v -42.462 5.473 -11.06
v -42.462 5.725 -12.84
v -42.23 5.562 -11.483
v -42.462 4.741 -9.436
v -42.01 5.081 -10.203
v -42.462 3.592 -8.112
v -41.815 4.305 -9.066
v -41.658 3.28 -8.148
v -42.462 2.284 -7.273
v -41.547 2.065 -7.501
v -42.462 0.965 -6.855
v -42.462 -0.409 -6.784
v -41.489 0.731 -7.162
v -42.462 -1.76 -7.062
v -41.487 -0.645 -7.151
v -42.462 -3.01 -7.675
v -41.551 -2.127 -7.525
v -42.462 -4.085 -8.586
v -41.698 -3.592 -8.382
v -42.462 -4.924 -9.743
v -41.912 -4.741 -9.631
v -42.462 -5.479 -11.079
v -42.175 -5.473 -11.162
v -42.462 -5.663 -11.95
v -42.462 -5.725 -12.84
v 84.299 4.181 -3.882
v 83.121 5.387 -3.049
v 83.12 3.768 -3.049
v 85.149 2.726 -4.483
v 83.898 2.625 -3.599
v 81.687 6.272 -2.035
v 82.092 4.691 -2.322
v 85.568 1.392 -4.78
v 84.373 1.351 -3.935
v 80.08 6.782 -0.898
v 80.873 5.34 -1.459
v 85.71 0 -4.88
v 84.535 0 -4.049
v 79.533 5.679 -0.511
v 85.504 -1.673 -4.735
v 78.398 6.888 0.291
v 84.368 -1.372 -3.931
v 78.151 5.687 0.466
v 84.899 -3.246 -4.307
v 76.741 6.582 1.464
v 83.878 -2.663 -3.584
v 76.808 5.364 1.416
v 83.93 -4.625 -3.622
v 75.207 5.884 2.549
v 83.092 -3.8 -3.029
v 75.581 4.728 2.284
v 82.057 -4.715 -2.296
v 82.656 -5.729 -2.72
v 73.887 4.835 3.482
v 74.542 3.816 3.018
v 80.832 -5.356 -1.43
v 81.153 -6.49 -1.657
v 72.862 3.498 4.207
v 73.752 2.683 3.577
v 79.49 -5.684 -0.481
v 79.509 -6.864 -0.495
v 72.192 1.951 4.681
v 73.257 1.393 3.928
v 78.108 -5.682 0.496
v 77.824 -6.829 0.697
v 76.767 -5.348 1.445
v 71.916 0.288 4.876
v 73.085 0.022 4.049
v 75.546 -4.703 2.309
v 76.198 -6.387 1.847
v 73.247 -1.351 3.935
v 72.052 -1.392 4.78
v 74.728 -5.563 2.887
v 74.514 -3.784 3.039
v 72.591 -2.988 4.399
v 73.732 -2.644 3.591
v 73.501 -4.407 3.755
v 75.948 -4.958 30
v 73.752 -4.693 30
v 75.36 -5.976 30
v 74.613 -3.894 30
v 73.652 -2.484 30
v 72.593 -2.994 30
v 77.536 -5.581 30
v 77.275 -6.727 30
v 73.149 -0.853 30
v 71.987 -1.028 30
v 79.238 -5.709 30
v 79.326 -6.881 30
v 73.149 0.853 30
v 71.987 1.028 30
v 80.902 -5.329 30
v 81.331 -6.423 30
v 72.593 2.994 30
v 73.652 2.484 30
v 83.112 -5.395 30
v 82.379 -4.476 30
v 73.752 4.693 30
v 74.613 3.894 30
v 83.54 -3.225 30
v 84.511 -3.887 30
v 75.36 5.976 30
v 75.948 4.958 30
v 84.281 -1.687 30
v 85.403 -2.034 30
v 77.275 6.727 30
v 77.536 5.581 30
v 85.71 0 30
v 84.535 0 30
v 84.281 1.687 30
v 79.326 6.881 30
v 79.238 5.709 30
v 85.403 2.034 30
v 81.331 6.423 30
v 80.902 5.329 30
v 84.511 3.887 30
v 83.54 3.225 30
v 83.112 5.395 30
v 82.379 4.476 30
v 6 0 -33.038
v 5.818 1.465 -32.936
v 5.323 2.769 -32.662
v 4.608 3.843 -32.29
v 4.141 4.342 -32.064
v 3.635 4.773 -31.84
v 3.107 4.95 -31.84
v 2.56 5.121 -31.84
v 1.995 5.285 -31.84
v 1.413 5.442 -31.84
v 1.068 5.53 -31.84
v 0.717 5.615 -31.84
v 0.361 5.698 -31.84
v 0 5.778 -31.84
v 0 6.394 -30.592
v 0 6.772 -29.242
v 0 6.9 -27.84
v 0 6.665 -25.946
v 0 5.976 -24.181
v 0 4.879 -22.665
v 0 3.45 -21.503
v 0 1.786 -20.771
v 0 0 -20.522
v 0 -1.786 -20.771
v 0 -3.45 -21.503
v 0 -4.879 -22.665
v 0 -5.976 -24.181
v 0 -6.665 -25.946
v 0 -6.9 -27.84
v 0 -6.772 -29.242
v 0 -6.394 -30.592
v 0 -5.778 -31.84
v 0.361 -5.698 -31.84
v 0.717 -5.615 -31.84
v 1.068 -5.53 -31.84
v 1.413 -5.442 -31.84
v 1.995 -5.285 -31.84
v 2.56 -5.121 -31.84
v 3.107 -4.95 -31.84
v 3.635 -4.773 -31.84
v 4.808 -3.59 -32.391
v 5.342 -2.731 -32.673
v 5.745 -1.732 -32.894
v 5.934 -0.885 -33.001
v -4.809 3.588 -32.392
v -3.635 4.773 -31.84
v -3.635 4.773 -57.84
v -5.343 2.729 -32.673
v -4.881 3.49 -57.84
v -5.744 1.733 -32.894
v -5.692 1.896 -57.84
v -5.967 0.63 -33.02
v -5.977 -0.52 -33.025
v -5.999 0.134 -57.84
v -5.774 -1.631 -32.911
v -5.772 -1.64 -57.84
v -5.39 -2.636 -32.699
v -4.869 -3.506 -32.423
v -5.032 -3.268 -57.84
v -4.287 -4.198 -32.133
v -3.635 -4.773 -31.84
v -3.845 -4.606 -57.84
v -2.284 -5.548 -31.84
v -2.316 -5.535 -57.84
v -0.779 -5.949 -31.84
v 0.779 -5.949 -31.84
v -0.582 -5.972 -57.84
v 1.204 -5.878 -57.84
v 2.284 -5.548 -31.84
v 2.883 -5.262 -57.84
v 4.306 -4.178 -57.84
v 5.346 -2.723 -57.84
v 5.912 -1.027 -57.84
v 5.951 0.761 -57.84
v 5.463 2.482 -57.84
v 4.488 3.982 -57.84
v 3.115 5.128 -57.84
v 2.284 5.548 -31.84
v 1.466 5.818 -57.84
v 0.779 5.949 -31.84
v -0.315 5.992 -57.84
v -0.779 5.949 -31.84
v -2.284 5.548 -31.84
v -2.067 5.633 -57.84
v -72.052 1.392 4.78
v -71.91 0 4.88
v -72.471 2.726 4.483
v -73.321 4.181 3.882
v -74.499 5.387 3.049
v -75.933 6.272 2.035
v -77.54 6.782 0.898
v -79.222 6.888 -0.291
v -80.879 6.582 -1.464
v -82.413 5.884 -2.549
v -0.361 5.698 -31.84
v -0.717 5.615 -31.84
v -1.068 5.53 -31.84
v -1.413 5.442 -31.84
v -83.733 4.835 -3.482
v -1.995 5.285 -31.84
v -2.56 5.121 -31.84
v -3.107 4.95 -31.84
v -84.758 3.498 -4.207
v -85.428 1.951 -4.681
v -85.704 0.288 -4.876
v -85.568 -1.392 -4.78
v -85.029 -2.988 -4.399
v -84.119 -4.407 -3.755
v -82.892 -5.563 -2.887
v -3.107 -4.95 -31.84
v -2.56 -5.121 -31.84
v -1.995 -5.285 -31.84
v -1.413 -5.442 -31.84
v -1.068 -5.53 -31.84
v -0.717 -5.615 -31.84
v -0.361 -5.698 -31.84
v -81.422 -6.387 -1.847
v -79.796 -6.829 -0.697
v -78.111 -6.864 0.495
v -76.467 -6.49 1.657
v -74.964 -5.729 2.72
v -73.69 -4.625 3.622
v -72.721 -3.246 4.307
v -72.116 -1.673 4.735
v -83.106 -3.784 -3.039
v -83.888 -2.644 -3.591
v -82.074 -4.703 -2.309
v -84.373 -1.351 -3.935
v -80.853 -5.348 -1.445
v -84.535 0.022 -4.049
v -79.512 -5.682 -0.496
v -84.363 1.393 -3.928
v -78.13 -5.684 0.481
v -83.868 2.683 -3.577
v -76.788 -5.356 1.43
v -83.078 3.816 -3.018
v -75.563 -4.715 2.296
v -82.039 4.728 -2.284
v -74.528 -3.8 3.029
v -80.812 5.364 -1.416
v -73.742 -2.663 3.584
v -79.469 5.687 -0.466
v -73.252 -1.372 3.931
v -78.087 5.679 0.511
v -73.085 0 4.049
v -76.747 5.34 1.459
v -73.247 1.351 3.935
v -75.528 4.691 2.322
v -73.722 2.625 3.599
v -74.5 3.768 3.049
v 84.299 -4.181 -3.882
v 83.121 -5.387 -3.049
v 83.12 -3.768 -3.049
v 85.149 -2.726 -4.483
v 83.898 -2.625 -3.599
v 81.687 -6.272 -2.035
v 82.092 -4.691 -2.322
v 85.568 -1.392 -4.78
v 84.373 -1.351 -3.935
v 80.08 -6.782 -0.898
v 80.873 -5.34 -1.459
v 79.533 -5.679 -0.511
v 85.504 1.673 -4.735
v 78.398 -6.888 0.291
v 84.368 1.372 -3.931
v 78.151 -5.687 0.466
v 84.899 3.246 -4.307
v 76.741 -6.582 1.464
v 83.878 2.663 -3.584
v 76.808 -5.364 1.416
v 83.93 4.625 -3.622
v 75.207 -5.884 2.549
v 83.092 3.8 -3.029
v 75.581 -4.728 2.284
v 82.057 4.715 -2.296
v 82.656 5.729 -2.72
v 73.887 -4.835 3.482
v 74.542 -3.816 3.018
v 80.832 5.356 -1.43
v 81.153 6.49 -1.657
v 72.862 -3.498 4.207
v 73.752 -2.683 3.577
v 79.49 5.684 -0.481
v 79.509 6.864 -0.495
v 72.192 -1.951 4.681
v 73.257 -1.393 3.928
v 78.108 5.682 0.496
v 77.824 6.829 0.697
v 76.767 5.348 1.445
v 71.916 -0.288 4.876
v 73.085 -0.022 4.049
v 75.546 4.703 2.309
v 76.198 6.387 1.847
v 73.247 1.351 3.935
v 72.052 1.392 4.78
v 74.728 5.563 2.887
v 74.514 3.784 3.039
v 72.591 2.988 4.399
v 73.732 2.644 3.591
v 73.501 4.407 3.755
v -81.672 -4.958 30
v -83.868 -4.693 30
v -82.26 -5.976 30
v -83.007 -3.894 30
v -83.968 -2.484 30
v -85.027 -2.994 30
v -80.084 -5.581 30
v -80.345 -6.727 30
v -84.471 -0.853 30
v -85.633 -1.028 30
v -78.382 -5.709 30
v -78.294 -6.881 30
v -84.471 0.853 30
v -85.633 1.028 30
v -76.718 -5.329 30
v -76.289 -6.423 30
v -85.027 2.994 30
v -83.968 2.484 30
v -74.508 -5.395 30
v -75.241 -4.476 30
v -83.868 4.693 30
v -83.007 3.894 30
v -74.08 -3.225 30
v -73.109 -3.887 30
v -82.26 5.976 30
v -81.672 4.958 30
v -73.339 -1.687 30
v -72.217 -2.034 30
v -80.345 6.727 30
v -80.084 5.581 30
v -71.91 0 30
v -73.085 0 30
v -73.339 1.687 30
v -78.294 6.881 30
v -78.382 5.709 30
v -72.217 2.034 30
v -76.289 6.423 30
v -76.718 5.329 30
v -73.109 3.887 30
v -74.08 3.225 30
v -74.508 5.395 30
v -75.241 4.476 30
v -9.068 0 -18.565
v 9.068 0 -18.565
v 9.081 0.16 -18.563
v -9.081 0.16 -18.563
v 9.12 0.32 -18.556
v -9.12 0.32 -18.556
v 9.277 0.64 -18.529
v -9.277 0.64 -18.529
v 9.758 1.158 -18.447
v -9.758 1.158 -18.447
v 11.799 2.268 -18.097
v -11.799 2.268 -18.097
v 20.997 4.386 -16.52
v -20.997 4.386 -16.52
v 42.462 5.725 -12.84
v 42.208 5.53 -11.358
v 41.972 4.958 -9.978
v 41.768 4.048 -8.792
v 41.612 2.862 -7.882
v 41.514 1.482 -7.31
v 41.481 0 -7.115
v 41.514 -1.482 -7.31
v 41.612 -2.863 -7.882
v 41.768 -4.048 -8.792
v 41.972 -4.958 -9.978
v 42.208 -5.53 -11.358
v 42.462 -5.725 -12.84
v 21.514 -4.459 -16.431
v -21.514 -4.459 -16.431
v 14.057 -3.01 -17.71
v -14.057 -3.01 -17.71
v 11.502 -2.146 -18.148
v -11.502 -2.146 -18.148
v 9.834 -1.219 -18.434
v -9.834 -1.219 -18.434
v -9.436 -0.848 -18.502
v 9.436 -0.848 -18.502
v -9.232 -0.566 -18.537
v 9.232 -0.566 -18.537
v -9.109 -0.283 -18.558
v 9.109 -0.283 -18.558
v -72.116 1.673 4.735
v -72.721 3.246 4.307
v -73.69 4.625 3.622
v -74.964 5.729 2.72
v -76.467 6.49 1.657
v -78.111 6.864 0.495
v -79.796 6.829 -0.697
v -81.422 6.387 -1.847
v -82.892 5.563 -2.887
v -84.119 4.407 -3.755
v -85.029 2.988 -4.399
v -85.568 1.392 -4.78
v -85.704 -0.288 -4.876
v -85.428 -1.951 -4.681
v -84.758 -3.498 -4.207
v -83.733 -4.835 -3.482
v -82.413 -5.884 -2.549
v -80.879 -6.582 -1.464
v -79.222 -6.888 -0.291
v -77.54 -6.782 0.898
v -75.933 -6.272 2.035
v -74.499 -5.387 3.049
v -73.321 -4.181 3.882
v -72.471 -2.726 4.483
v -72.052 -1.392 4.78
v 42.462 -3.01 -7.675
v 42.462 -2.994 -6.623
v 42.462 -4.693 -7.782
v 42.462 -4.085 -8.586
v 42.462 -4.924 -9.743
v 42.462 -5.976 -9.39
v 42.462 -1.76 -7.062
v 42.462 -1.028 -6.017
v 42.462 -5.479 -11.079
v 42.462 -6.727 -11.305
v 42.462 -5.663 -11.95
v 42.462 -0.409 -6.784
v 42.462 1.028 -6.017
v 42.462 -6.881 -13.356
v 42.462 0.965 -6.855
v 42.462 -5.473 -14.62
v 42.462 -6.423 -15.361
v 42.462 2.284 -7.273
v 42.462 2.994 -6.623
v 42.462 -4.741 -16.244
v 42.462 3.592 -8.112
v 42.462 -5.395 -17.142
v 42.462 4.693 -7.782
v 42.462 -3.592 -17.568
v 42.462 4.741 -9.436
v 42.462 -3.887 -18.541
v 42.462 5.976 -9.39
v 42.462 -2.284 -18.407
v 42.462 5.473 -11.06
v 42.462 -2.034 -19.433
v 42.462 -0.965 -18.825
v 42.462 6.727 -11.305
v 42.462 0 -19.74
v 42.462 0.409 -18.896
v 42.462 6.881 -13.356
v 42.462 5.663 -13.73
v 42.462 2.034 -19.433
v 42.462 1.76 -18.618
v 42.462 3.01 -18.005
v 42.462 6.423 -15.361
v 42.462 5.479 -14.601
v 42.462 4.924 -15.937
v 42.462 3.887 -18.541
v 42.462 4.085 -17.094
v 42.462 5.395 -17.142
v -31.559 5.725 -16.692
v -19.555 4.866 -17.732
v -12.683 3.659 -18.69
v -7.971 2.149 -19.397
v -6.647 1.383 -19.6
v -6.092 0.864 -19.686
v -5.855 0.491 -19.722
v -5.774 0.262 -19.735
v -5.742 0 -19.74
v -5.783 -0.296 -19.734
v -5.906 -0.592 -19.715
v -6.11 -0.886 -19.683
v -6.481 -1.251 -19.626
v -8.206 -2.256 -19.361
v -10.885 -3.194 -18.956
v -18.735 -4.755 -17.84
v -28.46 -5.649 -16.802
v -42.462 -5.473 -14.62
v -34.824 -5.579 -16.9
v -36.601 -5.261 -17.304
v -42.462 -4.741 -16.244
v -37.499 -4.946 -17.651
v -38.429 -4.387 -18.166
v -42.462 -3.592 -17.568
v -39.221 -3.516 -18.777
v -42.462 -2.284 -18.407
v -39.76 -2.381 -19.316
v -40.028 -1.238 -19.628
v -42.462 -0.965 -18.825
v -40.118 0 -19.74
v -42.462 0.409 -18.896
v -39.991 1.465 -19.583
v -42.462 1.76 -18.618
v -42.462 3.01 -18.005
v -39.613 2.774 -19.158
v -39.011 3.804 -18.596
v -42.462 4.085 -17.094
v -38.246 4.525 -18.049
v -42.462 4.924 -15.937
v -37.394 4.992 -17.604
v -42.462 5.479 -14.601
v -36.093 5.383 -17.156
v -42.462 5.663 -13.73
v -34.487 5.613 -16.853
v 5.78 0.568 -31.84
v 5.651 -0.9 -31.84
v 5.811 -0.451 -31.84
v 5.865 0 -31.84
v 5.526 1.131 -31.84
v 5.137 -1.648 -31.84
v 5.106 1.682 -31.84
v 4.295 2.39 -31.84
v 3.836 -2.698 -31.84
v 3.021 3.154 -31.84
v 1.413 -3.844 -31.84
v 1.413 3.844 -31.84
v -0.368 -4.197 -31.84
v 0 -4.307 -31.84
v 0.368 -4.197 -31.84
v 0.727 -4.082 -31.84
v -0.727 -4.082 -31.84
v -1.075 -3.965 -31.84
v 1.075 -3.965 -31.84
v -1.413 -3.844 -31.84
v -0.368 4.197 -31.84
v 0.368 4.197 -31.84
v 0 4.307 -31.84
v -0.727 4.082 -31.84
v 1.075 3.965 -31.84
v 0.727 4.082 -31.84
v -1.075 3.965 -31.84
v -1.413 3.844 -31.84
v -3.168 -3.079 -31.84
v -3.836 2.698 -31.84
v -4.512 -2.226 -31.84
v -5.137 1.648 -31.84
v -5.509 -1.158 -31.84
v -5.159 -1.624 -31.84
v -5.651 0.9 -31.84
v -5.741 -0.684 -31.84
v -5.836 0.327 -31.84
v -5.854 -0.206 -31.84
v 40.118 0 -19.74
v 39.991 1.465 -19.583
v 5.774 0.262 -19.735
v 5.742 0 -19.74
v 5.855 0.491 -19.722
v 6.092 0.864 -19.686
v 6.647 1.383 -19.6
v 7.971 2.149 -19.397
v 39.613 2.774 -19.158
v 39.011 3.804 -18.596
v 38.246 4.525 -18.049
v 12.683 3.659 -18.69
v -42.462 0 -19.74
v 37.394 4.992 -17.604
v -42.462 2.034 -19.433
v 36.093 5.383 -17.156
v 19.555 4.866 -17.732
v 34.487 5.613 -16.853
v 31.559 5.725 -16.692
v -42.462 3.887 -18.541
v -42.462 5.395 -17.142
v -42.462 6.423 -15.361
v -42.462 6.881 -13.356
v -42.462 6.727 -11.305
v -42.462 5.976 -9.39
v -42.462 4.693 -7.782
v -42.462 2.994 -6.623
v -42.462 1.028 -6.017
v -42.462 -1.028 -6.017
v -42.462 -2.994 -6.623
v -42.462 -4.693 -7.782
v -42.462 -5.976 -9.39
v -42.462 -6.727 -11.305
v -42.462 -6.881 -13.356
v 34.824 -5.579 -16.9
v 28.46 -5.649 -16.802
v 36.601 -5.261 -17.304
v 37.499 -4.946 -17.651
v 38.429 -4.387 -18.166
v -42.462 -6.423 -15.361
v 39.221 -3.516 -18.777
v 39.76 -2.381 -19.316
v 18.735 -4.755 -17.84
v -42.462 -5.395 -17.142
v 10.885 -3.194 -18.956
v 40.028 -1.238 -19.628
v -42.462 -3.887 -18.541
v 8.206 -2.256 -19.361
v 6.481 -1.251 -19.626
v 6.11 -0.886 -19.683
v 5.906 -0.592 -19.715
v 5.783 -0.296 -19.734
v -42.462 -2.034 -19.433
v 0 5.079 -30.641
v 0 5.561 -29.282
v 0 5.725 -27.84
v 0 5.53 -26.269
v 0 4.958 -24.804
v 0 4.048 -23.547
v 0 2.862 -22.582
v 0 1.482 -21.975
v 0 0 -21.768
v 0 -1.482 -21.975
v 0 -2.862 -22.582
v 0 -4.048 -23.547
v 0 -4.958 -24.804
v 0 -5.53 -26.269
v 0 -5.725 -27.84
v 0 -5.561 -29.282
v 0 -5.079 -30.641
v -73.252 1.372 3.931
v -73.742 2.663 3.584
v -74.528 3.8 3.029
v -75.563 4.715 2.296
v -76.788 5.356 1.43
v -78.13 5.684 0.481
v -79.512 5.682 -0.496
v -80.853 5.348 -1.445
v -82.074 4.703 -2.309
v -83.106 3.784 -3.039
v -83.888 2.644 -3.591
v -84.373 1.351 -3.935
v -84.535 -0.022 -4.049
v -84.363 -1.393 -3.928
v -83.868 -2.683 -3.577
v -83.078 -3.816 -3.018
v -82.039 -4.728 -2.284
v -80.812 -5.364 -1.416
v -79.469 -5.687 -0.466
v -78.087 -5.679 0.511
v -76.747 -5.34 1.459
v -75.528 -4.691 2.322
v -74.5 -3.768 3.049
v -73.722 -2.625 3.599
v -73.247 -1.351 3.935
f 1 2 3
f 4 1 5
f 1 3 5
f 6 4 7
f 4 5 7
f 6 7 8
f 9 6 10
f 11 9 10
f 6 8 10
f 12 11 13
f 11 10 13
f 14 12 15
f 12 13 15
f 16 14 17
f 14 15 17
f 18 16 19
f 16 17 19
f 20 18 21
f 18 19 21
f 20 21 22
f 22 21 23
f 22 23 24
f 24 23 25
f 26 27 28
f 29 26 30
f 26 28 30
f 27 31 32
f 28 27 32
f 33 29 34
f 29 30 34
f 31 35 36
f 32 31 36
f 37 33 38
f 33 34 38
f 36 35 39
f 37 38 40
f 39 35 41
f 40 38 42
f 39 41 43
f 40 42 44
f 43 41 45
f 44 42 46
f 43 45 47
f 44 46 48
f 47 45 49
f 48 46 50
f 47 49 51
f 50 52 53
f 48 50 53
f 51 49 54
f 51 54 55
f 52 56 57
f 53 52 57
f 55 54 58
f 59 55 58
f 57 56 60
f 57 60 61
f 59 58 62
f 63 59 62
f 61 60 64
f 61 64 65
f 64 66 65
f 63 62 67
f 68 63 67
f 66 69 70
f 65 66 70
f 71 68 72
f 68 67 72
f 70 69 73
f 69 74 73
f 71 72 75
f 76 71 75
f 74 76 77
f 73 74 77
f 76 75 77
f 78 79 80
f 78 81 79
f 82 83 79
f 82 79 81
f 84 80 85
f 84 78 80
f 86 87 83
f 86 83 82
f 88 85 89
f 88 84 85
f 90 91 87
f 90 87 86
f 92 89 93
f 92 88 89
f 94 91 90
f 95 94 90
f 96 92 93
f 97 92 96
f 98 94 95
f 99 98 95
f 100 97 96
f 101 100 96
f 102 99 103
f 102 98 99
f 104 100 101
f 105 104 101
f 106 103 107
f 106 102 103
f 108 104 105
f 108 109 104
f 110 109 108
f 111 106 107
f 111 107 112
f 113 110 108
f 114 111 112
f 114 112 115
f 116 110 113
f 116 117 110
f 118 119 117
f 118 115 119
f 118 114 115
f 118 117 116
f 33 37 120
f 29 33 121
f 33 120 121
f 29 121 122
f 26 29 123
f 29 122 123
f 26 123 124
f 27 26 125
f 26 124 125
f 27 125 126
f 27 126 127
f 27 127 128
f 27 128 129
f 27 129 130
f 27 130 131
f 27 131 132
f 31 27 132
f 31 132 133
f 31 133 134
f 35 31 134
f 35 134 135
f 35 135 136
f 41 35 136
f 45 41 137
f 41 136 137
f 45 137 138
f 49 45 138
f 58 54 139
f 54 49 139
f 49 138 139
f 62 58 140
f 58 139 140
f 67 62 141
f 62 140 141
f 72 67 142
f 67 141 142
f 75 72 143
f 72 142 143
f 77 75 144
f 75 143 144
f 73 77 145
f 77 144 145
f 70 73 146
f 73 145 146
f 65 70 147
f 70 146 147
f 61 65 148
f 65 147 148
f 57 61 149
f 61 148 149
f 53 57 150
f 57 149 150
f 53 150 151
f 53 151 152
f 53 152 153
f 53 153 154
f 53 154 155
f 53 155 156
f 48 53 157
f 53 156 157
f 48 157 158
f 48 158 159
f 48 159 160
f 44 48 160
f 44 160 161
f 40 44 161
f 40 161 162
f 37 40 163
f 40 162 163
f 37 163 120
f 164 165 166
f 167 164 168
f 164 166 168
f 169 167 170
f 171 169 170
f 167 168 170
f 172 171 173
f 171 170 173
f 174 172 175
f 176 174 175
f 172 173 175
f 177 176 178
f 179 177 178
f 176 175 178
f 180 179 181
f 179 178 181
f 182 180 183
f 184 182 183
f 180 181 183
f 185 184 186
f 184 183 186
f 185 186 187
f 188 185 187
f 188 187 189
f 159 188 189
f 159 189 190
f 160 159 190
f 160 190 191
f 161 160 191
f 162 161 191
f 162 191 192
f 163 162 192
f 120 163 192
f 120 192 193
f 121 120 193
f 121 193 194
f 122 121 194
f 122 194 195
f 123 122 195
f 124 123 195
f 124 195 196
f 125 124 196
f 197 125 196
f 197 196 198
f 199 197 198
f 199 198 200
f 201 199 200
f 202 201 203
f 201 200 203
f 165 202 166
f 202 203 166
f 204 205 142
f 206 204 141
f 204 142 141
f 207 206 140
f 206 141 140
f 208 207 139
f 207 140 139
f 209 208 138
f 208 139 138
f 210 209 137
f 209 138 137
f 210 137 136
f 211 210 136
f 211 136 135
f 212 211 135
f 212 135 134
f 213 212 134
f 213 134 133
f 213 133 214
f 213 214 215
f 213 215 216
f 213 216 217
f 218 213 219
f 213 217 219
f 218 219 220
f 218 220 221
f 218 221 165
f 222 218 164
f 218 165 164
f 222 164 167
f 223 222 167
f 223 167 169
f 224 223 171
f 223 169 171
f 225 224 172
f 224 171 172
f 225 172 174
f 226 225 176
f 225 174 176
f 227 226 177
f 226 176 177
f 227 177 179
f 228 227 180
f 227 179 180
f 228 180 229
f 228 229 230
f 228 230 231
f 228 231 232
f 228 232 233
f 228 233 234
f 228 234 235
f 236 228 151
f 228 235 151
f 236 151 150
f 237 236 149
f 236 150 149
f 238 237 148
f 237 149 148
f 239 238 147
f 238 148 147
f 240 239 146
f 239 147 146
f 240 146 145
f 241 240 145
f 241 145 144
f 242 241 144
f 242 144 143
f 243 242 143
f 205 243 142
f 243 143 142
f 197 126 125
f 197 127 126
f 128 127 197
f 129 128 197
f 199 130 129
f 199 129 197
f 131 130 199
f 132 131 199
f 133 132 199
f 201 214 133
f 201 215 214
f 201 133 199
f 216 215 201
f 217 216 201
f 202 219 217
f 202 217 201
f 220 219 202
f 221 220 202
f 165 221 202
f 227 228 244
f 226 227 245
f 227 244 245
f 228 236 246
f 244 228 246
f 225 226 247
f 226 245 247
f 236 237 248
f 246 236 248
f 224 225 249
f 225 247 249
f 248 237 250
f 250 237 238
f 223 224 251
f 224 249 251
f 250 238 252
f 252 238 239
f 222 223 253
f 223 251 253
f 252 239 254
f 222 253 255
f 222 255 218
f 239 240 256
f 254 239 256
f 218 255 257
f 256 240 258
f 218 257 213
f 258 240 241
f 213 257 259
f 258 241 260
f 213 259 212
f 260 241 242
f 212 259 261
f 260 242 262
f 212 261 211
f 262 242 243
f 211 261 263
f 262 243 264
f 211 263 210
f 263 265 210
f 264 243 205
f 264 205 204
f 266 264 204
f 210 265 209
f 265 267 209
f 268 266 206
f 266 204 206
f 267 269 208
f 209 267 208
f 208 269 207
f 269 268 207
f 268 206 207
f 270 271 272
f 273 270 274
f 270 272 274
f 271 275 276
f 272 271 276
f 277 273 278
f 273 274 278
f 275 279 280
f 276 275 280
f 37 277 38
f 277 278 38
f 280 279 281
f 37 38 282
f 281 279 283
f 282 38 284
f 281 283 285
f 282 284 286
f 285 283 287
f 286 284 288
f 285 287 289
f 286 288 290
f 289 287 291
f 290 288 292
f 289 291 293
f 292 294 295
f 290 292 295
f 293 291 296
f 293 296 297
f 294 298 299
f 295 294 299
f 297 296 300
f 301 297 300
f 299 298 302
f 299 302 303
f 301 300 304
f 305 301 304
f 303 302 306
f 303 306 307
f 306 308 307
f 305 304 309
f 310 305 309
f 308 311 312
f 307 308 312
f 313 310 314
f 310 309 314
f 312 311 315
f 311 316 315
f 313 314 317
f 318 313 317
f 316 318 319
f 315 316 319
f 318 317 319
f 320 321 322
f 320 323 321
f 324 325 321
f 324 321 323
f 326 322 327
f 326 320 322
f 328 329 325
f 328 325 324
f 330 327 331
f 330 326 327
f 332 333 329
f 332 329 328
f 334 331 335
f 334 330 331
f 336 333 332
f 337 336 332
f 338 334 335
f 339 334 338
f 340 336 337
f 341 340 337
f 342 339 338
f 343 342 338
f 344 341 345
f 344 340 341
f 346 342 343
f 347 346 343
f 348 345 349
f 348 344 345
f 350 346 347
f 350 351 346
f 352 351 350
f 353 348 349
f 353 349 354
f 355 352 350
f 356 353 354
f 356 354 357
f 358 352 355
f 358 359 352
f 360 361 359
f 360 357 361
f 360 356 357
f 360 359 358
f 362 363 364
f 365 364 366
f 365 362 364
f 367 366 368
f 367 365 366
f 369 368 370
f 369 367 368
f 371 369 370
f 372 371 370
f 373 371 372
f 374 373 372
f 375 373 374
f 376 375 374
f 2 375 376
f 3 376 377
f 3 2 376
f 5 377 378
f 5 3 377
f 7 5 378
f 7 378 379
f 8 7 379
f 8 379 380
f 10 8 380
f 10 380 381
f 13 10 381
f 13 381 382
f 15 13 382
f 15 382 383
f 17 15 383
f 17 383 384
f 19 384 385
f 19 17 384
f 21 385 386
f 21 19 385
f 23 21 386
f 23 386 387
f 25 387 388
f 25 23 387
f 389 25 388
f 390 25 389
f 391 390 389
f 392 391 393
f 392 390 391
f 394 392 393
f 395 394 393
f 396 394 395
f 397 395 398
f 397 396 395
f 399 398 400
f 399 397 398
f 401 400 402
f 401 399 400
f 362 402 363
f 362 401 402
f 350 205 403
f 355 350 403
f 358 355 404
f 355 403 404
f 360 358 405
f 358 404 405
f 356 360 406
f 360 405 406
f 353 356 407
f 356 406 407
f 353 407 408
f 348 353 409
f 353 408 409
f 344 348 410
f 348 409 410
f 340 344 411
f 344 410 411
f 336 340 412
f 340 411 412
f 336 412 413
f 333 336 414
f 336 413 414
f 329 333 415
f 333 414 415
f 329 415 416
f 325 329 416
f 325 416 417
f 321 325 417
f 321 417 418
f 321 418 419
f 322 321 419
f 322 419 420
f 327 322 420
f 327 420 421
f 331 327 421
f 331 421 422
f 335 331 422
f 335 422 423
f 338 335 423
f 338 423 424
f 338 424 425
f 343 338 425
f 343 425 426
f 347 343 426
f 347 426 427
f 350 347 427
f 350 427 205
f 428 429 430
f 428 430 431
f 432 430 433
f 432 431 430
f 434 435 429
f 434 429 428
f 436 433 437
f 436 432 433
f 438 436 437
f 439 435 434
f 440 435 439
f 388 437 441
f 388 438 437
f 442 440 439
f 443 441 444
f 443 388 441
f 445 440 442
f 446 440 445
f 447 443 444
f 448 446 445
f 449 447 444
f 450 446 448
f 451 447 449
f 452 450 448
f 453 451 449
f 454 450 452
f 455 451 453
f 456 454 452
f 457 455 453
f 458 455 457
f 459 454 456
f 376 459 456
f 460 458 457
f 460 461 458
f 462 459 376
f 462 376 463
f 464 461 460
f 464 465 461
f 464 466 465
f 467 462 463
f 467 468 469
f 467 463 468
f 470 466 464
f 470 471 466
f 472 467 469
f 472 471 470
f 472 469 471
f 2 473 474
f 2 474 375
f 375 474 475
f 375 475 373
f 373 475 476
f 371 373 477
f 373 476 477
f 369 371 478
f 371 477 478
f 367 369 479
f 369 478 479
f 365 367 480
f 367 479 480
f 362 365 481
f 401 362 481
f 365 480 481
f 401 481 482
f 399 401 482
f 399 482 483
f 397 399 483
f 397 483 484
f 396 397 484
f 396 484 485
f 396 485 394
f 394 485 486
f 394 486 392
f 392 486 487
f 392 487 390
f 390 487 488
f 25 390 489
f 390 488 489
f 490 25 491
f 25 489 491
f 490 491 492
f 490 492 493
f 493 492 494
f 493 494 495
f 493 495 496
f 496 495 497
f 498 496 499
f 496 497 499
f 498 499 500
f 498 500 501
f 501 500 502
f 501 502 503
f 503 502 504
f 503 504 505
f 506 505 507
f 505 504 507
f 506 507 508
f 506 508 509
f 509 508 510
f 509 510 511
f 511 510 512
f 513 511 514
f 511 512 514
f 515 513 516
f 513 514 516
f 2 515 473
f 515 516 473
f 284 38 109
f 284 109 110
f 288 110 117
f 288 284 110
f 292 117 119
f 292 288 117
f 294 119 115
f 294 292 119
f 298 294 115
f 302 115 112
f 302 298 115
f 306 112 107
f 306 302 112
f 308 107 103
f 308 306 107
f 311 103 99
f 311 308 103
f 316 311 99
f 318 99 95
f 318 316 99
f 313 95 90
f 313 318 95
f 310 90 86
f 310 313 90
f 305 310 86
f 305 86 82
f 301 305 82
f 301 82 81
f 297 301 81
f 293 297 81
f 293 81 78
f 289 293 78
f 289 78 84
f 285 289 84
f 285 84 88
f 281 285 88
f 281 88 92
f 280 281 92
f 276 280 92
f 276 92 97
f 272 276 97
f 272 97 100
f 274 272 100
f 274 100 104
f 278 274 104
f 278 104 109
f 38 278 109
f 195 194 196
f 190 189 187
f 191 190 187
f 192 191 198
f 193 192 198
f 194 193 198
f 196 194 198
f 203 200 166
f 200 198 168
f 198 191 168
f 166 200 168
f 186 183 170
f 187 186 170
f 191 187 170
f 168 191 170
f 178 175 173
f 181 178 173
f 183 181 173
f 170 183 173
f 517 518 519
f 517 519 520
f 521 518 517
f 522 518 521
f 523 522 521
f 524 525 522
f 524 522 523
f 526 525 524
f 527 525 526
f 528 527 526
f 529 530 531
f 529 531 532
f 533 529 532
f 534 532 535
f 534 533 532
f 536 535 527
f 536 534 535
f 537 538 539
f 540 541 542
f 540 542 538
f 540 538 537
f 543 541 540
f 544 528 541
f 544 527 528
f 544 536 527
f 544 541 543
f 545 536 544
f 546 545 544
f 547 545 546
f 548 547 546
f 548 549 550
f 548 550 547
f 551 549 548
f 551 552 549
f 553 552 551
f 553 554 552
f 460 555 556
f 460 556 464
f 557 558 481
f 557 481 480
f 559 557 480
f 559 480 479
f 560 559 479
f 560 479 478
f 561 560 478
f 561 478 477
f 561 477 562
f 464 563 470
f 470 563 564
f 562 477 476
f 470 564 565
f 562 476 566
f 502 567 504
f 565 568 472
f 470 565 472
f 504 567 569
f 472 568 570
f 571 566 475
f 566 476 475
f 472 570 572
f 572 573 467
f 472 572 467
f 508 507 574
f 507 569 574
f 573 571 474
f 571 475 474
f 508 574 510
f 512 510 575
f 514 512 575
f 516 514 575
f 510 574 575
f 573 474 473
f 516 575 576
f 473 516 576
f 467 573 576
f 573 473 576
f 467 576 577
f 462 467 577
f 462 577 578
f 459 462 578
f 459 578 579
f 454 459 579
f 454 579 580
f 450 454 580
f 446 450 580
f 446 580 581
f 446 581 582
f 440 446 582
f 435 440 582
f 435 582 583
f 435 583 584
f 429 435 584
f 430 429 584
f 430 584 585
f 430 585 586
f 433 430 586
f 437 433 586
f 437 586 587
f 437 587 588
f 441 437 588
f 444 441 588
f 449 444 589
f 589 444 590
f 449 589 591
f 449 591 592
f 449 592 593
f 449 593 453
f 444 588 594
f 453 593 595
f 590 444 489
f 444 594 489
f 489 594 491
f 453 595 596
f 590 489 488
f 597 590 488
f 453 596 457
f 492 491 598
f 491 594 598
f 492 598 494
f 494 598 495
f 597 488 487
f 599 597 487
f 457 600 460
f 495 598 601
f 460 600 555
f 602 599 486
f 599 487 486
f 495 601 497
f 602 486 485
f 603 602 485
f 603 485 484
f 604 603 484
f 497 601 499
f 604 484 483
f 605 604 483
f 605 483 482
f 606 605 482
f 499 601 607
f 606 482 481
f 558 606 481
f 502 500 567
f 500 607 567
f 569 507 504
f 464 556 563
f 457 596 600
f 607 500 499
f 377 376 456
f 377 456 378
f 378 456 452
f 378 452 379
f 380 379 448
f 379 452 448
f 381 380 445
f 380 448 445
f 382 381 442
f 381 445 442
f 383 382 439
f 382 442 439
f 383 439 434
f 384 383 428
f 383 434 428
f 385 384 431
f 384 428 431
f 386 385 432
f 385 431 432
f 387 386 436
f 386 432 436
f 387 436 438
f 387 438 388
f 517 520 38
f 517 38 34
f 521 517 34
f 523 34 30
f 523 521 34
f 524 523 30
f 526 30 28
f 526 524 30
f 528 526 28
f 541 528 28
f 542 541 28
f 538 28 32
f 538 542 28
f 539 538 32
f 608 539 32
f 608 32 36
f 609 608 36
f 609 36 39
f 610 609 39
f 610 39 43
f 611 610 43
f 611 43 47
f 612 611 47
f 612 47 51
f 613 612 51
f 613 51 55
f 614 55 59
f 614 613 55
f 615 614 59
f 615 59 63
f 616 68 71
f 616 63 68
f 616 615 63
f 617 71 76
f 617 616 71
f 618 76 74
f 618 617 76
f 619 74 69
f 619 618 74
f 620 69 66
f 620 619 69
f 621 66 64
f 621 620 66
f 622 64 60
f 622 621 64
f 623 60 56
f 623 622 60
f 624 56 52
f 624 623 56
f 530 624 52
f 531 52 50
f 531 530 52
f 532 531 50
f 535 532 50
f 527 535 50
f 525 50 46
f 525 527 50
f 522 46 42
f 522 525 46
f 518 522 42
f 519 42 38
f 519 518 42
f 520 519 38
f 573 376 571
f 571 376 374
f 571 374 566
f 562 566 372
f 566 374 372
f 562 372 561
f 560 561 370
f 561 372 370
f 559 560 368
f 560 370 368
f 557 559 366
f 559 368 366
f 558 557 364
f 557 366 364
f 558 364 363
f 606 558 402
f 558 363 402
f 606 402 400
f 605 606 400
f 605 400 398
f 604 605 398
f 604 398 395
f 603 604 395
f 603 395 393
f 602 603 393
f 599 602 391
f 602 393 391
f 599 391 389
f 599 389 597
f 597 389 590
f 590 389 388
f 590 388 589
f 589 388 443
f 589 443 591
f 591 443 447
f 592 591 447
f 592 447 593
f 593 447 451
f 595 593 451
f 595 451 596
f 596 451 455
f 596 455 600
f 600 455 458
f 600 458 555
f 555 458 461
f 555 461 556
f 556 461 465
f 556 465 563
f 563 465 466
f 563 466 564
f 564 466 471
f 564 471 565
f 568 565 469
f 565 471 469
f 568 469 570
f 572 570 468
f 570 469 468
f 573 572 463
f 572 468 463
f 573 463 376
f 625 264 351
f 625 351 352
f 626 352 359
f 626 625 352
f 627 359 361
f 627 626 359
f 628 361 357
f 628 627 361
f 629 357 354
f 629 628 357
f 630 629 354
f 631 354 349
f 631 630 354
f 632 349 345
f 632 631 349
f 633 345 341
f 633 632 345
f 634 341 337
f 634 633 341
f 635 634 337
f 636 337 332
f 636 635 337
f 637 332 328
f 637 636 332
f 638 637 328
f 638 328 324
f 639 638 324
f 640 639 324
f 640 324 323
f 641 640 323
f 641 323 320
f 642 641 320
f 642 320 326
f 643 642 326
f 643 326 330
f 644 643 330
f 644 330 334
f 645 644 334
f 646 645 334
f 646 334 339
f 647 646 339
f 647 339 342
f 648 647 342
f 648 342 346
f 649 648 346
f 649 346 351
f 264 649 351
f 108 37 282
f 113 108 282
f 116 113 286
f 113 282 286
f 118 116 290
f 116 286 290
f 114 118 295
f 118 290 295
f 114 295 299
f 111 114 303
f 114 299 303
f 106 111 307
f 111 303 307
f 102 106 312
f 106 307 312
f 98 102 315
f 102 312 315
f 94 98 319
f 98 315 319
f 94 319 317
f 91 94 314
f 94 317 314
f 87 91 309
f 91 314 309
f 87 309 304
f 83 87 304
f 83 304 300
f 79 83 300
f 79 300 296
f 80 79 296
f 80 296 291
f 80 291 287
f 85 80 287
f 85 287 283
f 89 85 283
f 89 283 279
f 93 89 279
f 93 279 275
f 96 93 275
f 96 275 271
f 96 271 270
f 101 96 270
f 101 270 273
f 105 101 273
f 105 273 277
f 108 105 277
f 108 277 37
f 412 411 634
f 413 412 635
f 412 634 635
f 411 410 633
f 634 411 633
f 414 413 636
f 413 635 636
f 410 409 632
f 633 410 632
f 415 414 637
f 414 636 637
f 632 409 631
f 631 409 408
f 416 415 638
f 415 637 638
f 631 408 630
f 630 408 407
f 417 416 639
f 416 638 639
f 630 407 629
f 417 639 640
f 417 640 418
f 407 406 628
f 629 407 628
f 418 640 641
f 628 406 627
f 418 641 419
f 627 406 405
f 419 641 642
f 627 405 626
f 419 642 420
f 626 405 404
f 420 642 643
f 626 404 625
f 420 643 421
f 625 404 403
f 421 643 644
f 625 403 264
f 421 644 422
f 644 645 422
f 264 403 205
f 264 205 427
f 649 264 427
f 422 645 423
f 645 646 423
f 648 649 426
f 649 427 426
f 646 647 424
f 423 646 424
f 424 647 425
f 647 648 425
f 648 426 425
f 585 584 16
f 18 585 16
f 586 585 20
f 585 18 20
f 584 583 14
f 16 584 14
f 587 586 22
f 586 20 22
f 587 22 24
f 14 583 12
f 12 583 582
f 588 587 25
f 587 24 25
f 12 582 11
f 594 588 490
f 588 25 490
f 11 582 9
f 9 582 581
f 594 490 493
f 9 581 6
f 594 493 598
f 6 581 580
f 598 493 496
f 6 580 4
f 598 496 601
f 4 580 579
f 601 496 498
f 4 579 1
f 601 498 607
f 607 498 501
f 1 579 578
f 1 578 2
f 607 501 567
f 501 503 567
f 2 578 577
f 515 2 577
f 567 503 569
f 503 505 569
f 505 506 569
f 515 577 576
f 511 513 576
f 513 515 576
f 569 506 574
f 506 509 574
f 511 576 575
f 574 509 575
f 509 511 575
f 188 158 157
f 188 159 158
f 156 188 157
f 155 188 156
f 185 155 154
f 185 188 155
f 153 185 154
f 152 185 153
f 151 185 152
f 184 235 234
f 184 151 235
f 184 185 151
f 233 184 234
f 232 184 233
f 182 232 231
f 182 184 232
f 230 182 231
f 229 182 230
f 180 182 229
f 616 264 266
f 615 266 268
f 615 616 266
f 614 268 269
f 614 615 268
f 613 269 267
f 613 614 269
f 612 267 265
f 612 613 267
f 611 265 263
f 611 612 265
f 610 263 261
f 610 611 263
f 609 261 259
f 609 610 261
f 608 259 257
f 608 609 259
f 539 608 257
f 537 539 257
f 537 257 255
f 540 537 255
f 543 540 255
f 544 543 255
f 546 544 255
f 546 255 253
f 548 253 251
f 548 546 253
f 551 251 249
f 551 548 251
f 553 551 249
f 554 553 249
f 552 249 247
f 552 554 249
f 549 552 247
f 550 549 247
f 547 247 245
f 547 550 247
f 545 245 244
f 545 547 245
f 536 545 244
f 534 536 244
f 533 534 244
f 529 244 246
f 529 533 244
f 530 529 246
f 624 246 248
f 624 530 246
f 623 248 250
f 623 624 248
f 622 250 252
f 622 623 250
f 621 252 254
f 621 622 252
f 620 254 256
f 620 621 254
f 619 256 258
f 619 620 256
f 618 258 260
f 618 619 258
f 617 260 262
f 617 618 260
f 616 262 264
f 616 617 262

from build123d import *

# Parameters (mm, degrees)
SKETCH1_R                                      = 6.9
SKETCH1_R_2                                    = 5.725
C_PROGRAM_FILES_SOLIDWORKS_CORP_SOLIDWOR_DEPTH = 91.484727216
SKETCH1_ON_SEGMENT_2_R                         = 6.9
SKETCH1_ON_SEGMENT_2_R_2                       = 5.725
C_PROGRAM_FILES_SOLIDWORKS_CORP_SOLI_3_DEPTH   = 37.901943701
SKETCH11_R                                     = 6.9
SKETCH11_R_2                                   = 5.725
CIRCULAR_TUBE_26_9_X_2_3_2_DEPTH               = 91.484727216
SKETCH11_ON_SEGMENT_2_R                        = 6.9
SKETCH11_ON_SEGMENT_2_R_2                      = 5.725
CIRCULAR_TUBE_26_9_X_2_3_2_2_DEPTH             = 37.901943701
SKETCH12_R                                     = 6.9
SKETCH12_R_2                                   = 5.725
CIRCULAR_TUBE_26_9_X_2_3_3_DEPTH               = 84.924568966
WELD_TRIM_1_OUTLINE_W                          = 5.725
WELD_TRIM_1_OUTLINE_H                          = 38.951410817
WELD_TRIM_2_OUTLINE_W                          = 5.725
WELD_TRIM_2_OUTLINE_H                          = 38.951445723
PART_START                                     = 2e-09
PART_RUN_ON_DEPTH                              = 73.1683
BODY_START                                     = -3e-09
BODY_3_RUN_ON_DEPTH                            = 58.289875
SKETCH_10_R                                    = 6
EXTRUDE_3_DEPTH                                = 26


# Read off the part's stored shape, not the designer's step: 잘라내기/늘리기1, 잘라내기/늘리기2
with BuildPart() as part:
    # Sketch1 → C_PROGRAM FILES_SOLIDWORKS CORP_SOLIDWOR (new body)
    with BuildSketch(Plane(origin=(0, 0, -27.84), x_dir=(0.3330829487777661, 0, 0.9428975284905078), z_dir=(-0.9428975284905078, 0, 0.33308294877776606))):
        Circle(SKETCH1_R)
        Circle(SKETCH1_R_2, mode=Mode.SUBTRACT)
    extrude(amount=C_PROGRAM_FILES_SOLIDWORKS_CORP_SOLIDWOR_DEPTH)

    # C_PROGRAM FILES_SOLIDWORKS CORP_SOLI 2
    split(bisect_by=Plane(origin=(-78.81, 0, 0), x_dir=(0, 1, 0), z_dir=(0.577458679, 0, -0.816419913)), keep=Keep.TOP)

    # Sketch1 → part run on (add)
    with BuildSketch(Plane(origin=(0, 0, -27.84), x_dir=(0.3330829487777661, 0, 0.9428975284905078), z_dir=(-0.9428975284905078, 0, 0.33308294877776606)).offset(PART_START)):
        Circle(SKETCH1_R)
        Circle(SKETCH1_R_2, mode=Mode.SUBTRACT)
    extrude(amount=-PART_RUN_ON_DEPTH)

    # Weld Trim 3
    split(bisect_by=Plane(origin=(0, 0, -27.84), x_dir=(0, -1, 0), z_dir=(-1, 0, 0)), keep=Keep.TOP)



with BuildPart() as body_2:
    # Sketch1 on segment 2 (carried to segment 2) → C_PROGRAM FILES_SOLIDWORKS CORP_SOLI 3 (new body)
    with BuildSketch(Plane(origin=(-78.81, 0, -7.901943701), x_dir=(1, 0, 0), z_dir=(0, 0, 1))):
        Circle(SKETCH1_ON_SEGMENT_2_R)
        Circle(SKETCH1_ON_SEGMENT_2_R_2, mode=Mode.SUBTRACT)
    extrude(amount=C_PROGRAM_FILES_SOLIDWORKS_CORP_SOLI_3_DEPTH)

    # C_PROGRAM FILES_SOLIDWORKS CORP_SOLI 3 m
    split(bisect_by=Plane(origin=(-78.81, 0, 0), x_dir=(0, -1, 0), z_dir=(-0.577458679, 0, 0.816419913)), keep=Keep.TOP)


with BuildPart() as body_3:
    # Sketch11 → Circular tube 26.9 X 2.3(2) (new body)
    with BuildSketch(Plane(origin=(0, 0, -27.84), x_dir=(0.33308294877776584, 0, -0.9428975284905079), z_dir=(0.9428975284905079, 0, 0.33308294877776584))):
        Circle(SKETCH11_R)
        Circle(SKETCH11_R_2, mode=Mode.SUBTRACT)
    extrude(amount=CIRCULAR_TUBE_26_9_X_2_3_2_DEPTH)

    # Circular tube 26.9 X 2.3(2) mitre 1
    split(bisect_by=Plane(origin=(78.81, 0, 0), x_dir=(0, -1, 0), z_dir=(-0.577458679, 0, -0.816419913)), keep=Keep.TOP)

    # Sketch11 → body 3 run on (add)
    with BuildSketch(Plane(origin=(0, 0, -27.84), x_dir=(0.33308294877776584, 0, -0.9428975284905079), z_dir=(0.9428975284905079, 0, 0.33308294877776584)).offset(BODY_START)):
        Circle(SKETCH11_R)
        Circle(SKETCH11_R_2, mode=Mode.SUBTRACT)
    extrude(amount=-BODY_3_RUN_ON_DEPTH)

    # Weld Trim 3
    split(bisect_by=Plane(origin=(0, 0, -27.84), x_dir=(0, 1, 0), z_dir=(1, 0, 0)), keep=Keep.TOP)


with BuildPart() as body_4:
    # Sketch11 on segment 2 (carried to segment 2) → Circular tube 26.9 X 2.3_2 2 (new body)
    with BuildSketch(Plane(origin=(78.81, 0, -7.901943701), x_dir=(1, 0, 0), z_dir=(0, 0, 1))):
        Circle(SKETCH11_ON_SEGMENT_2_R)
        Circle(SKETCH11_ON_SEGMENT_2_R_2, mode=Mode.SUBTRACT)
    extrude(amount=CIRCULAR_TUBE_26_9_X_2_3_2_2_DEPTH)

    # Circular tube 26.9 X 2.3_2 2 mitre 1
    split(bisect_by=Plane(origin=(78.81, 0, 0), x_dir=(0, 1, 0), z_dir=(0.577458679, 0, 0.816419913)), keep=Keep.TOP)


with BuildPart() as body_5:
    # Sketch12 → Circular tube 26.9 X 2.3(3) (new body)
    with BuildSketch(Plane(origin=(-42.462284483, 0, -12.84), x_dir=(0, 0, -1), z_dir=(1, 0, 0))):
        Circle(SKETCH12_R)
        Circle(SKETCH12_R_2, mode=Mode.SUBTRACT)
    extrude(amount=CIRCULAR_TUBE_26_9_X_2_3_3_DEPTH)

    # Weld Trim 1 outline → Weld Trim 1 (revolve, cut)
    with BuildSketch(Plane(origin=(8.743516403, 0, -24.751312059), x_dir=(0, 1, 0), z_dir=(0.333082948777766, 0, -0.942897528490508))):
        with Locations((2.8625, 18.314360576)):
            Rectangle(WELD_TRIM_1_OUTLINE_W, WELD_TRIM_1_OUTLINE_H)
    revolve(axis=Axis((8.743516403, 0, -24.751312059), (0.942897528490508, 0, 0.333082948777766)), mode=Mode.SUBTRACT)

    # Weld Trim 2 outline → Weld Trim 2 (revolve, cut)
    with BuildSketch(Plane(origin=(-8.743516403, 0, -24.751312059), x_dir=(0, 1, 0), z_dir=(-0.333082948777766, 0, -0.942897528490508))):
        with Locations((2.8625, -18.314343123)):
            Rectangle(WELD_TRIM_2_OUTLINE_W, WELD_TRIM_2_OUTLINE_H)
    revolve(axis=Axis((-8.743516403, 0, -24.751312059), (0.942897528490508, 0, -0.333082948777766)), mode=Mode.SUBTRACT)


with BuildPart() as part_1:
    add(part.part)

    add(body_3.part)  # 보스-돌출3 merges body 3
    # 스케치10 → 보스-돌출3 (add)
    with BuildSketch(Plane.XY.offset(-57.84)):
        with Locations(Location((0, 0, 0), (0, 0, 127.290512292))):
            Circle(SKETCH_10_R)
    extrude(amount=EXTRUDE_3_DEPTH)


solid = Compound([body_2.part, body_4.part, body_5.part, part_1.part])
